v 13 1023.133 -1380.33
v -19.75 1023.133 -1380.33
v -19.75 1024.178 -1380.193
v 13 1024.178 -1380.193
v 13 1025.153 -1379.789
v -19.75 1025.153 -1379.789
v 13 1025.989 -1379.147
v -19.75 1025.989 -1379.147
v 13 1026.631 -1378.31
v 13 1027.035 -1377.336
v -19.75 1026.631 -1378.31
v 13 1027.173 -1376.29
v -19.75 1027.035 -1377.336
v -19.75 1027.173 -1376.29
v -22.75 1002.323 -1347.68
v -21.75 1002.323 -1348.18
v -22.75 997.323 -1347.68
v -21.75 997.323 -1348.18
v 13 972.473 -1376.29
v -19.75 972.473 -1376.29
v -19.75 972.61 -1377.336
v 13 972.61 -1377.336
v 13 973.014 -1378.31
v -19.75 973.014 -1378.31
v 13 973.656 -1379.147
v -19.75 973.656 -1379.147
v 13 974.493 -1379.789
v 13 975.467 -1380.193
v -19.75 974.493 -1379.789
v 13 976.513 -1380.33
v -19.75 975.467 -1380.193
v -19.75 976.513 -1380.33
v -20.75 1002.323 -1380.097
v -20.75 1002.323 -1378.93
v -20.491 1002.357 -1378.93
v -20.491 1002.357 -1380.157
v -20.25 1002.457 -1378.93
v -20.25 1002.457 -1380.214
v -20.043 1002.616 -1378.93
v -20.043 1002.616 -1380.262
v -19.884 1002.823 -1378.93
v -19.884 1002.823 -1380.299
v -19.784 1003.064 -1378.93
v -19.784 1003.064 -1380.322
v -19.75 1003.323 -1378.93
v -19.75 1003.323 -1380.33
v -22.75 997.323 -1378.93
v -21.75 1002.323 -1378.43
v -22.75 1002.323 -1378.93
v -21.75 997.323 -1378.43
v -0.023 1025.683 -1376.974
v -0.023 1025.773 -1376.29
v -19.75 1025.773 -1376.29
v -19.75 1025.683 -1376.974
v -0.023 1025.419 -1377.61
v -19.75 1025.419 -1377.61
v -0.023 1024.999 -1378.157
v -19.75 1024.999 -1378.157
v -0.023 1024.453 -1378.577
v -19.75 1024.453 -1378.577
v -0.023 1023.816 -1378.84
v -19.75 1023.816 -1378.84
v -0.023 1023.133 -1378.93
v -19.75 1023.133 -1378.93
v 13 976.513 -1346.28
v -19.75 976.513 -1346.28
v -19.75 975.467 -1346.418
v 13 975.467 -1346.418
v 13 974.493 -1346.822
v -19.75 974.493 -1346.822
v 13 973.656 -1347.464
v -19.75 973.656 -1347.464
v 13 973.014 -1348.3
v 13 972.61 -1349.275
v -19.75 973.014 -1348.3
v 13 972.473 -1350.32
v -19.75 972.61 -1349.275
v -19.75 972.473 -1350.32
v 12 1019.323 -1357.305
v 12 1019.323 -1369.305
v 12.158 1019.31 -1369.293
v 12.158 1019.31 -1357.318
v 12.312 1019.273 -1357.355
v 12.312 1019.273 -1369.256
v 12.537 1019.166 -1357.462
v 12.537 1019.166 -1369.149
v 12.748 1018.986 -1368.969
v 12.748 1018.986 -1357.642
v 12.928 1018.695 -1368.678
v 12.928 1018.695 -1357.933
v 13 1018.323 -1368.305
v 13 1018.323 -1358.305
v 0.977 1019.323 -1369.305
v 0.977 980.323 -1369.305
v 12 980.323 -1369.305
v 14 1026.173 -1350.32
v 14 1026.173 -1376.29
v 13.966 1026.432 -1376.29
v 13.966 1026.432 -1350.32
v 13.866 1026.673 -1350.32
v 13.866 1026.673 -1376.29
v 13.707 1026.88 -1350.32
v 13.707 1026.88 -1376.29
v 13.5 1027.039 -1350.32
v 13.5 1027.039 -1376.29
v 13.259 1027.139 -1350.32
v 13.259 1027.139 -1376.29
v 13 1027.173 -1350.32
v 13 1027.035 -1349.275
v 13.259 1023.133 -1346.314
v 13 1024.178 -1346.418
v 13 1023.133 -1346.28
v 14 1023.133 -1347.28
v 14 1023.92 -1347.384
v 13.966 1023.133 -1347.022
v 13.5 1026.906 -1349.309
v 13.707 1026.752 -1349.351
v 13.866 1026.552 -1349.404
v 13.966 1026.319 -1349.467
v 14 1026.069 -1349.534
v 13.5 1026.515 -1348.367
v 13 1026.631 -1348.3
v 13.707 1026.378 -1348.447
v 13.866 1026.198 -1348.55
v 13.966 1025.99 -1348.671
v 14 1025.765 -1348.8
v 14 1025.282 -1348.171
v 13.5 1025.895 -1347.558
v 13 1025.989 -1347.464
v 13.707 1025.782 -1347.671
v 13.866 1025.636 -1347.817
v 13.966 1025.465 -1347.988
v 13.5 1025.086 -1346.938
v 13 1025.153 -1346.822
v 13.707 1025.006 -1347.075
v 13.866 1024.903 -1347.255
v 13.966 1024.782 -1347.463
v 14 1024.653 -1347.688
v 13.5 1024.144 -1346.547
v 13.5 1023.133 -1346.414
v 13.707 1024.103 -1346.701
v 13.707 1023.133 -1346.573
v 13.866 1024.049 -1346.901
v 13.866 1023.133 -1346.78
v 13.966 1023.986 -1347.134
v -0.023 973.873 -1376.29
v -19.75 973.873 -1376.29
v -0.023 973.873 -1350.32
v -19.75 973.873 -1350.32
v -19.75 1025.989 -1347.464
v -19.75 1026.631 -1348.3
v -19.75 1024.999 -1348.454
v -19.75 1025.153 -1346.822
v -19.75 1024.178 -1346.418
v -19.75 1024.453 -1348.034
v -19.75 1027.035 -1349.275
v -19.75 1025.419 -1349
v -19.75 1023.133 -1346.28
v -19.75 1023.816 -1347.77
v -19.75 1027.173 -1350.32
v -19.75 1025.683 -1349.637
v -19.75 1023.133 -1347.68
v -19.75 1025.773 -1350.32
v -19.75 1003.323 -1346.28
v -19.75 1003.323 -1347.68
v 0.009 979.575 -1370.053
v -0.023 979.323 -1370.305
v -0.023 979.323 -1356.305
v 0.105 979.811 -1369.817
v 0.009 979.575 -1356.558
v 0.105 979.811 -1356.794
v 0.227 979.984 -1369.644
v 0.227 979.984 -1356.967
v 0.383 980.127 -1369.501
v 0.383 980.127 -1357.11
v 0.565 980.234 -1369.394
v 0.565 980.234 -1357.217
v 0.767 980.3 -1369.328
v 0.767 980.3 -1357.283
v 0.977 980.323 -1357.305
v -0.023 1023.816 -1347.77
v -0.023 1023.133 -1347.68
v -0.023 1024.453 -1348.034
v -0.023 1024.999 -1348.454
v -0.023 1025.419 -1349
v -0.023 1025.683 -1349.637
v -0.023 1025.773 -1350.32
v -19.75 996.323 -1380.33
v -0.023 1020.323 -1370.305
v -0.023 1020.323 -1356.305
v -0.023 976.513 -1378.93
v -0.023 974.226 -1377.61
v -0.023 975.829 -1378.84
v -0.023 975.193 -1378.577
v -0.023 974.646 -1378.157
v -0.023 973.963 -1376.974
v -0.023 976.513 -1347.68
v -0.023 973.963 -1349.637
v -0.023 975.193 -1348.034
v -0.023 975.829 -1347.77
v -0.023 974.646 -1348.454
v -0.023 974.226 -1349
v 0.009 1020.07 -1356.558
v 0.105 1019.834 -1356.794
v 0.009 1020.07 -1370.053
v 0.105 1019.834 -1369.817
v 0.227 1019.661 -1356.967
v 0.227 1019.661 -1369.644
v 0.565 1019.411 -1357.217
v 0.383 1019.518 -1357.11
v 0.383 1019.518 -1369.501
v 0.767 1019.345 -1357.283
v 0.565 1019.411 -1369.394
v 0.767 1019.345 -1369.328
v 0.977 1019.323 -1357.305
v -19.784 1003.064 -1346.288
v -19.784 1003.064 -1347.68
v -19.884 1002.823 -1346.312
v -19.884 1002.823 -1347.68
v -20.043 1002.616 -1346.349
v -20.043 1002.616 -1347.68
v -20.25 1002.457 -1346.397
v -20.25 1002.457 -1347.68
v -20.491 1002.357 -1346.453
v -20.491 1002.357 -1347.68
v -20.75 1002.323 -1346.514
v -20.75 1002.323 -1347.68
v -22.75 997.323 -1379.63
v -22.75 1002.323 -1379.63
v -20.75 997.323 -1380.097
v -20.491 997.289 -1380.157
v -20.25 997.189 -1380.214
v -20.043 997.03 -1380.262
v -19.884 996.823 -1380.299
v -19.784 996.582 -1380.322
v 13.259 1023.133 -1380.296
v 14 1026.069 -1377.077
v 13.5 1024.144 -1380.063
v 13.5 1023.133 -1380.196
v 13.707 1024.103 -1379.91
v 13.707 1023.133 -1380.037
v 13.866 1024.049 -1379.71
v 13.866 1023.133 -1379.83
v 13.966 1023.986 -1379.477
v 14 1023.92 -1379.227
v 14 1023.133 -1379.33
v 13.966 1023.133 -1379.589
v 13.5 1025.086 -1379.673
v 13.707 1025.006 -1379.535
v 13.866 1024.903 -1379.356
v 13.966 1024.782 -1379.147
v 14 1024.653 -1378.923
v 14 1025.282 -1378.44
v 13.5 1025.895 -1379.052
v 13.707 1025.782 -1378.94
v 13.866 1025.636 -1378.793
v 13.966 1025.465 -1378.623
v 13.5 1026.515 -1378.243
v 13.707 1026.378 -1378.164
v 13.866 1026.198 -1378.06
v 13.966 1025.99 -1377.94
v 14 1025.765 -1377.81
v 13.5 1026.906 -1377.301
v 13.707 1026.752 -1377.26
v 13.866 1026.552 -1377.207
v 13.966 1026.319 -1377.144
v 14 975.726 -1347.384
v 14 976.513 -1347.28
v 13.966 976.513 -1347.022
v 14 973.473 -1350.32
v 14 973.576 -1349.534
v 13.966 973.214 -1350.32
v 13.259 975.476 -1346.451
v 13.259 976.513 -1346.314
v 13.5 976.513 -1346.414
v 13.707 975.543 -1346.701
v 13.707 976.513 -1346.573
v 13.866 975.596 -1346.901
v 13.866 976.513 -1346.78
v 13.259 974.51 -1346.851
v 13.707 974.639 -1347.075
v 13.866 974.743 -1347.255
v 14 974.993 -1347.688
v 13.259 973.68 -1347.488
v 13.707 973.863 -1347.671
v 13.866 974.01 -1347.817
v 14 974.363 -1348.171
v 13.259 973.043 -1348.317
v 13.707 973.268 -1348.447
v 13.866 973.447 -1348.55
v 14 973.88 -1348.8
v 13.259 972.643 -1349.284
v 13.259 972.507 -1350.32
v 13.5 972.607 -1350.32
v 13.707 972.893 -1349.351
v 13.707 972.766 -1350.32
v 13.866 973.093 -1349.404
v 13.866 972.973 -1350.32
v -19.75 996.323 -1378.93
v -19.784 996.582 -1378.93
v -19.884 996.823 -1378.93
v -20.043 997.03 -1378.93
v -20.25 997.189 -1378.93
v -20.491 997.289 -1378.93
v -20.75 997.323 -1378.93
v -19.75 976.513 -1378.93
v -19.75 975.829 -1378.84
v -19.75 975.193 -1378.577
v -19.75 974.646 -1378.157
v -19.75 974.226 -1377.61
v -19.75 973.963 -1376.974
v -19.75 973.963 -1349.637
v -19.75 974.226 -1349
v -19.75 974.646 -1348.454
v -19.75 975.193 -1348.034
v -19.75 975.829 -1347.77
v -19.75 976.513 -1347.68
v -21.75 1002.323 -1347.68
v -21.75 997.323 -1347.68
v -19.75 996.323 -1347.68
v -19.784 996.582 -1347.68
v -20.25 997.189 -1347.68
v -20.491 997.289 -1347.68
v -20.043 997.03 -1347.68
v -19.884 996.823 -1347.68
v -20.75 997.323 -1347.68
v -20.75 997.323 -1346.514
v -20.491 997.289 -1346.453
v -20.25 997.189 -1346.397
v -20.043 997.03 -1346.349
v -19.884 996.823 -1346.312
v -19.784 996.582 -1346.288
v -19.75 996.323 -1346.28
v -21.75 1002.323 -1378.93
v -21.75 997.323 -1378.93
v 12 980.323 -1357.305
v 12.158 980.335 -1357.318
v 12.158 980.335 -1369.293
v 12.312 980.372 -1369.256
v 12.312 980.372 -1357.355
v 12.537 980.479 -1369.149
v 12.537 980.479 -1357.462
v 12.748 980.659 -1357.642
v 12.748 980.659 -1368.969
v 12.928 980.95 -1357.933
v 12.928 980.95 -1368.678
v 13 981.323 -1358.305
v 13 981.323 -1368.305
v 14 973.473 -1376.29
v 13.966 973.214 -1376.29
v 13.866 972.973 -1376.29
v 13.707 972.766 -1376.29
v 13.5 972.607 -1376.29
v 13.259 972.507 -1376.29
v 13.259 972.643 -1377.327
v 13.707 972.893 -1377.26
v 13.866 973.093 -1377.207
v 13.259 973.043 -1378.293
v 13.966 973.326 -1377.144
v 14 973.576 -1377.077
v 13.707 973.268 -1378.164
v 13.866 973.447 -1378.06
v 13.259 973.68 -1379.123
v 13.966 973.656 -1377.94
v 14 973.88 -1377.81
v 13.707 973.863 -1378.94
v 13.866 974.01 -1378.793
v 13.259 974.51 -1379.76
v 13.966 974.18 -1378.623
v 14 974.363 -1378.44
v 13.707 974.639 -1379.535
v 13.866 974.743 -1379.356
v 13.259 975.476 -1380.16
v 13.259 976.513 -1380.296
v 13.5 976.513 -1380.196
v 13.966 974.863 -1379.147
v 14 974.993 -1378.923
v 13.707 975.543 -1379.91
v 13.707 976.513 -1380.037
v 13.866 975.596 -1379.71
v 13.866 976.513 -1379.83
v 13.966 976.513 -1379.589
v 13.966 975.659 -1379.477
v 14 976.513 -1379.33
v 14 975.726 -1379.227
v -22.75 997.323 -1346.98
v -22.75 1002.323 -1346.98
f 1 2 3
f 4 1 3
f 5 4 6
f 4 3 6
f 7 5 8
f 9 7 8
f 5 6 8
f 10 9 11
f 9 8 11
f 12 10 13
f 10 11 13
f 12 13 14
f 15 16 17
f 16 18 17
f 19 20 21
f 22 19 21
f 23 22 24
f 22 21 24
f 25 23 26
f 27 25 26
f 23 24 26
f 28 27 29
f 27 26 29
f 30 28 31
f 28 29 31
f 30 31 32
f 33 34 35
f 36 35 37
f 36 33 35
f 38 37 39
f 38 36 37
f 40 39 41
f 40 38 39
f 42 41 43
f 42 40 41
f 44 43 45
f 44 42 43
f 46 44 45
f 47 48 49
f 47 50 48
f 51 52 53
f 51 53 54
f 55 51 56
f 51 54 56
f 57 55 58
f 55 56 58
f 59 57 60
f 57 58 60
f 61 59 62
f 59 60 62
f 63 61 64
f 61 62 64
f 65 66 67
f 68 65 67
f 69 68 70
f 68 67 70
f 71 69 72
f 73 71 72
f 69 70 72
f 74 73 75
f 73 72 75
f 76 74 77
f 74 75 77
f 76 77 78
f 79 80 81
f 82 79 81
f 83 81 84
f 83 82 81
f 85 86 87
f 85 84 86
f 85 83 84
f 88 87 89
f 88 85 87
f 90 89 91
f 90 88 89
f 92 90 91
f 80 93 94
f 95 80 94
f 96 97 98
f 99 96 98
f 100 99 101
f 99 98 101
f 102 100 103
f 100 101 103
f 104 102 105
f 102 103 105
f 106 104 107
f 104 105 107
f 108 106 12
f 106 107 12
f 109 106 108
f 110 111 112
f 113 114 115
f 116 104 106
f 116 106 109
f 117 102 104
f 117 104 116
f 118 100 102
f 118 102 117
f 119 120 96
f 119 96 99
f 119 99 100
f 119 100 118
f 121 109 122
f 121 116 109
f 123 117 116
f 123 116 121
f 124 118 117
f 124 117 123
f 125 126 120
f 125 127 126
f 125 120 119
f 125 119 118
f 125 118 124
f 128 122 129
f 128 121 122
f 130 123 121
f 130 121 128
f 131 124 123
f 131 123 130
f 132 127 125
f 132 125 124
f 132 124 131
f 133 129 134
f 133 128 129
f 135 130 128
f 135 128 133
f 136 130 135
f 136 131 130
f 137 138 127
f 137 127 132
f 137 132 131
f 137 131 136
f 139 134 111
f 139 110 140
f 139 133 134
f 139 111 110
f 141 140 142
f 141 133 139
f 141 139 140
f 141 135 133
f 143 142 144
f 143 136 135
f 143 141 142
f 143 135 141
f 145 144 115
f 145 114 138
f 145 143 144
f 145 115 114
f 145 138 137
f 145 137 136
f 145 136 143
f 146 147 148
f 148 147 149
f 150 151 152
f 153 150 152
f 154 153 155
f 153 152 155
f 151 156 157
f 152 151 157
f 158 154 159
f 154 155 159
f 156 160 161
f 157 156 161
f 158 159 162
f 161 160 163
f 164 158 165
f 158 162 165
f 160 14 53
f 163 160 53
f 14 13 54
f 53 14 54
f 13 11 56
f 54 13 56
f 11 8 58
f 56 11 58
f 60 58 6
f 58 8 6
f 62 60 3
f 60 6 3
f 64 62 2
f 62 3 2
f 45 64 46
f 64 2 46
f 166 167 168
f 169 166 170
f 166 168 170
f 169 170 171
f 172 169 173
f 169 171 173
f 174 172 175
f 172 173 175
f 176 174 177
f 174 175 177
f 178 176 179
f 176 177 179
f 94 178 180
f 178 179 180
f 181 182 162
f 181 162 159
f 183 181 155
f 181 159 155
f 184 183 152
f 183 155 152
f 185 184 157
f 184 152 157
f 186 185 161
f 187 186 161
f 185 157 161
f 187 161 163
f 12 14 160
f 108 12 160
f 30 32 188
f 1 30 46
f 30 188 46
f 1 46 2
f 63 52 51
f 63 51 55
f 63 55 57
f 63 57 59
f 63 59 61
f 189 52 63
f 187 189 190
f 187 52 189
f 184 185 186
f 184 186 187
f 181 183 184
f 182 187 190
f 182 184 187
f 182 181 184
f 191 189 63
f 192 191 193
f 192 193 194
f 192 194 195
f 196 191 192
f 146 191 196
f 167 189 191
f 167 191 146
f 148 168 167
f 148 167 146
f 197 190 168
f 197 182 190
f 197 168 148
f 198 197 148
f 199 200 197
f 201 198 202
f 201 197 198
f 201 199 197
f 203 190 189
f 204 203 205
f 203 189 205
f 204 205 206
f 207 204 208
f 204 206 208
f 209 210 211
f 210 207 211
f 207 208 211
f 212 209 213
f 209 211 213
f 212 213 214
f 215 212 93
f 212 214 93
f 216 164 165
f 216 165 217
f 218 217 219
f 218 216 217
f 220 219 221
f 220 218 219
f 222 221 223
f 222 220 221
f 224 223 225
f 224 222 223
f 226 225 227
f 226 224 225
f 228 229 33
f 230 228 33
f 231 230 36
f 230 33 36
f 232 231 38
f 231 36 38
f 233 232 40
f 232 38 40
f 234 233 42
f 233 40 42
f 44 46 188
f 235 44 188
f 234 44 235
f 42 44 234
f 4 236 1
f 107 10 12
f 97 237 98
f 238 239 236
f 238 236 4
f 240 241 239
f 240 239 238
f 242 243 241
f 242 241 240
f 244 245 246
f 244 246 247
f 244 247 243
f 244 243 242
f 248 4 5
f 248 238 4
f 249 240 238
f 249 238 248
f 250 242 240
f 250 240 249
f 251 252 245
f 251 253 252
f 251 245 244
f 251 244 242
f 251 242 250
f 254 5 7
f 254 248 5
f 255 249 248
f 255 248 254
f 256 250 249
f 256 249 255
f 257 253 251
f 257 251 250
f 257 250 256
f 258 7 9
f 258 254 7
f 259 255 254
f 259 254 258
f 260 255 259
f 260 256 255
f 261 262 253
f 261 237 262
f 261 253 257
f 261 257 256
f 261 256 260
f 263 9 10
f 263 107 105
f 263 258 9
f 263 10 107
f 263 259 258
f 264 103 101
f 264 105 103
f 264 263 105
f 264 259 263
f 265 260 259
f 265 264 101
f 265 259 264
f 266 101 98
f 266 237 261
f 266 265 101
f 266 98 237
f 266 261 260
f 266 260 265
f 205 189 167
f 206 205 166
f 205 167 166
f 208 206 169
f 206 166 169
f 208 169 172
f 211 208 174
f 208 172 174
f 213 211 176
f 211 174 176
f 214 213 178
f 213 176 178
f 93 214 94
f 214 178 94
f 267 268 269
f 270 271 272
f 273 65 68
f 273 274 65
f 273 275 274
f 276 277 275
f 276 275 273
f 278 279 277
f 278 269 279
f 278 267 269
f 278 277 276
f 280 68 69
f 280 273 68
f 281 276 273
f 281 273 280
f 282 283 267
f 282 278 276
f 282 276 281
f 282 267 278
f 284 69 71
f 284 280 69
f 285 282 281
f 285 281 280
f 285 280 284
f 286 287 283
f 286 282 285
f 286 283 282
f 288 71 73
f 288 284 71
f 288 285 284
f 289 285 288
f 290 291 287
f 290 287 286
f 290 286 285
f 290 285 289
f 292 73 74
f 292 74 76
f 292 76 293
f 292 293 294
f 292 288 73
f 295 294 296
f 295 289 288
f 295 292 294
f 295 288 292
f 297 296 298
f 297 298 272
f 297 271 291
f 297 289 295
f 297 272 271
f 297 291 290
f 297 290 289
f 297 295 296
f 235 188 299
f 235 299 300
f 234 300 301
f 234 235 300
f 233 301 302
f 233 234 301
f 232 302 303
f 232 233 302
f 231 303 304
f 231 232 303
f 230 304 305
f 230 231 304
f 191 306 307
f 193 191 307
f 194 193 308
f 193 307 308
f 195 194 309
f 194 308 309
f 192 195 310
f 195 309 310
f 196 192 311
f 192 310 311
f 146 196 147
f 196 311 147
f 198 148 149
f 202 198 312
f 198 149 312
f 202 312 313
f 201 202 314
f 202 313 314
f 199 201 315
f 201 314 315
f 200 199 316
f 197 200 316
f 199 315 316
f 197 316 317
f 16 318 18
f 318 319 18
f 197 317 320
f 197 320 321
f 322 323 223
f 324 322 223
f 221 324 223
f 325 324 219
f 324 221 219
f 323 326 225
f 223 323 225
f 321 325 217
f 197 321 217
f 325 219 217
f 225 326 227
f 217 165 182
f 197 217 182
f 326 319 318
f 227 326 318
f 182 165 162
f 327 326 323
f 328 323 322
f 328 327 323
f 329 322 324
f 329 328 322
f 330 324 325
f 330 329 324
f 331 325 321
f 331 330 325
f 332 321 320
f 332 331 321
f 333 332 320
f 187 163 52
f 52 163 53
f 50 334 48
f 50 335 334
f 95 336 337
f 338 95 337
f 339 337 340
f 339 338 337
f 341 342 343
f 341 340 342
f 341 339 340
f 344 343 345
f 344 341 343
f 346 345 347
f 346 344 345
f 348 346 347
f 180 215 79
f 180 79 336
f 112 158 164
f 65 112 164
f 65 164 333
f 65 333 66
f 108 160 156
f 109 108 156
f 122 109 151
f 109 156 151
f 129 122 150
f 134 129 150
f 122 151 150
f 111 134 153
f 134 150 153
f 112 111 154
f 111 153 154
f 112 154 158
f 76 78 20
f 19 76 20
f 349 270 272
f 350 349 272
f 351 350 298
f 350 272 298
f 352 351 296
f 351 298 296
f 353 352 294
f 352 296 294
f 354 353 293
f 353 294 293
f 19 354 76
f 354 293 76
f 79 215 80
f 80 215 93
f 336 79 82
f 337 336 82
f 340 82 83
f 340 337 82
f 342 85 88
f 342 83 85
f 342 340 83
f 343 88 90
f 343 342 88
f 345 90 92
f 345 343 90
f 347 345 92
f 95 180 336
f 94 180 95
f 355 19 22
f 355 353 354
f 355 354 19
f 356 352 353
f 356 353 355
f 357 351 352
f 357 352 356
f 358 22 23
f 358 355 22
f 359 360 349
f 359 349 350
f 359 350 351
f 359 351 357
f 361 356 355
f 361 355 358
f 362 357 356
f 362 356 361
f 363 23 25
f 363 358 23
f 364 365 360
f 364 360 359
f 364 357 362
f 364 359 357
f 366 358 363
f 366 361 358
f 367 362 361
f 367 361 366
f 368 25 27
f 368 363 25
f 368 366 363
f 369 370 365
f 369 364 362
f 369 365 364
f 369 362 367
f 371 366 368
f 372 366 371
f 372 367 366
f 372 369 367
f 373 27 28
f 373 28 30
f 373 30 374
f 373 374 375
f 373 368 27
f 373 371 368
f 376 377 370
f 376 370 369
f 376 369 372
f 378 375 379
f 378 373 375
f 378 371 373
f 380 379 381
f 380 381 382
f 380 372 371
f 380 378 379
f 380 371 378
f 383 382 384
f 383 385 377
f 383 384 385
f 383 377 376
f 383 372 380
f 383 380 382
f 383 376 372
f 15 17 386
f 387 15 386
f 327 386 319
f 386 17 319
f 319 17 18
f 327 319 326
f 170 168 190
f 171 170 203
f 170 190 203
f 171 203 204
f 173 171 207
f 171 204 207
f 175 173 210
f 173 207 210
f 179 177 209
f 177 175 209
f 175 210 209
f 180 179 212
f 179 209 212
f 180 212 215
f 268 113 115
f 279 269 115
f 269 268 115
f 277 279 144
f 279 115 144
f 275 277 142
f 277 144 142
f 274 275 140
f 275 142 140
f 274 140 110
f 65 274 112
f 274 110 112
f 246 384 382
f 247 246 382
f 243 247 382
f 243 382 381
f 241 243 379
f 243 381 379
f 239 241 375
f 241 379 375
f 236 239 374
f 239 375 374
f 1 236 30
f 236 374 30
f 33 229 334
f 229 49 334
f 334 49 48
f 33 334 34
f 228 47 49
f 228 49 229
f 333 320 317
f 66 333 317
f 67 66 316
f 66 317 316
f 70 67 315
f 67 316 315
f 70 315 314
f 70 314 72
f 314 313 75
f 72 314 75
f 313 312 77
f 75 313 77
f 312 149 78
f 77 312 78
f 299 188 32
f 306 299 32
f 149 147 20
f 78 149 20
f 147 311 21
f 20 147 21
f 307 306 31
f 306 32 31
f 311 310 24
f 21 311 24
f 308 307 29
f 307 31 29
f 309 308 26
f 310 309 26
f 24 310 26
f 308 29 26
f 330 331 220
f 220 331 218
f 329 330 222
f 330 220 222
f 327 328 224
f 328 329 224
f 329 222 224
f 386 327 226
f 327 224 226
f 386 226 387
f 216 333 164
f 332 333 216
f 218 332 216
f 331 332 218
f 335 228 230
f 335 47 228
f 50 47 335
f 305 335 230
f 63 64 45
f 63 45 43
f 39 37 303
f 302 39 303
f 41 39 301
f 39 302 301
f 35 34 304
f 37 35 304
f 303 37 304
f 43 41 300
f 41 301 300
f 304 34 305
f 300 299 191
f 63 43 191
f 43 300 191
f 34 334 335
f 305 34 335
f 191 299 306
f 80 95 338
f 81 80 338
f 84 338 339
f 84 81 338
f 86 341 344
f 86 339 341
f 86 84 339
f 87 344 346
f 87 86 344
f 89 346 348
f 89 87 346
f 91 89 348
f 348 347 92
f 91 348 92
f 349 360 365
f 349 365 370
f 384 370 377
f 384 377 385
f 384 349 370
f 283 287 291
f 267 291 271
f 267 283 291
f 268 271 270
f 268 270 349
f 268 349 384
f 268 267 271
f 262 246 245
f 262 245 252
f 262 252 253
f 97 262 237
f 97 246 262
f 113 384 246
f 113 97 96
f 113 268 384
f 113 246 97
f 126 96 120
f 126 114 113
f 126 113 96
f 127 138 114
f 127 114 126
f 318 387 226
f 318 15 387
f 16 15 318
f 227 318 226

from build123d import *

# Parameters (mm, degrees)
BOSS_EXTRUDE2_DEPTH      = 13
BOSS_EXTRUDE2_DEPTH_BACK = 19.75
SKETCH2_W                = 39
SKETCH2_H                = 12
BOSS_EXTRUDE3_DEPTH      = 1
CUT_EXTRUDE1_DEPTH       = 19.727
CLIP_EDGE_DEPTH          = 2.5
FILLET1_R                = 1


with BuildPart() as part:
    # Sketch2 → Boss-Extrude2 (new, two sides: drawn at the far end of the back side and taken through both)
    with BuildSketch(Plane(origin=(0, 0, 0), x_dir=(0, -1, 0), z_dir=(1, 0, 0)).offset(-BOSS_EXTRUDE2_DEPTH_BACK)):
        with BuildLine():
            Line((-1027.172700071, 1376.290334899), (-1027.172700071, 1350.320334899))
            ThreePointArc((-1027.172700071, 1350.320334899), (-1025.989411467, 1347.463623503), (-1023.132700071, 1346.280334899))
            Line((-1023.132700071, 1346.280334899), (-976.512700071, 1346.280334899))
            ThreePointArc((-976.512700071, 1346.280334899), (-973.655988675, 1347.463623503), (-972.472700071, 1350.320334899))
            Line((-972.472700071, 1350.320334899), (-972.472700071, 1376.290334899))
            ThreePointArc((-972.472700071, 1376.290334899), (-973.655988675, 1379.147046295), (-976.512700071, 1380.330334899))
            Line((-976.512700071, 1380.330334899), (-1023.132700071, 1380.330334899))
            ThreePointArc((-1023.132700071, 1380.330334899), (-1025.989411467, 1379.147046295), (-1027.172700071, 1376.290334899))
        make_face()
        with Locations((-999.822700071, 1363.305334899)):
            Rectangle(SKETCH2_W, SKETCH2_H, mode=Mode.SUBTRACT)
    extrude(amount=BOSS_EXTRUDE2_DEPTH + BOSS_EXTRUDE2_DEPTH_BACK)

    # Sketch3 → Boss-Extrude3 (add)
    with BuildSketch(Plane.YZ.offset(13)):
        with BuildLine():
            Line((972.472700071, -1350.320334899), (972.472700071, -1376.290334899))
            ThreePointArc((972.472700071, -1376.290334899), (973.655988675, -1379.147046295), (976.512700071, -1380.330334899))
            Line((976.512700071, -1380.330334899), (1023.132700071, -1380.330334899))
            ThreePointArc((1023.132700071, -1380.330334899), (1025.989411467, -1379.147046295), (1027.172700071, -1376.290334899))
            Line((1027.172700071, -1376.290334899), (1027.172700071, -1350.320334899))
            ThreePointArc((1027.172700071, -1350.320334899), (1025.989411467, -1347.463623503), (1023.132700071, -1346.280334899))
            Line((1023.132700071, -1346.280334899), (976.512700071, -1346.280334899))
            ThreePointArc((976.512700071, -1346.280334899), (973.655988675, -1347.463623503), (972.472700071, -1350.320334899))
        make_face()
    extrude(amount=BOSS_EXTRUDE3_DEPTH)

    # Sketch6 → Cut-Extrude1 (cut)
    with BuildSketch(Plane(origin=(-19.75, 0, 0), x_dir=(0, -1, 0), z_dir=(-1, 0, 0))):
        with BuildLine():
            Line((-1025.772700071, -1350.320334899), (-1025.772700071, -1376.290334899))
            ThreePointArc((-1025.772700071, -1376.290334899), (-1024.999461974, -1378.157096801), (-1023.132700071, -1378.930334899))
            Line((-1023.132700071, -1378.930334899), (-976.512700071, -1378.930334899))
            ThreePointArc((-976.512700071, -1378.930334899), (-974.645938169, -1378.157096801), (-973.872700071, -1376.290334899))
            Line((-973.872700071, -1376.290334899), (-973.872700071, -1350.320334899))
            ThreePointArc((-973.872700071, -1350.320334899), (-974.645938169, -1348.453572996), (-976.512700071, -1347.680334899))
            Line((-976.512700071, -1347.680334899), (-1023.132700071, -1347.680334899))
            ThreePointArc((-1023.132700071, -1347.680334899), (-1024.999461974, -1348.453572996), (-1025.772700071, -1350.320334899))
        make_face()
    extrude(amount=-CUT_EXTRUDE1_DEPTH, mode=Mode.SUBTRACT)

    # Sketch10 → Clip Edge (add, symmetric)
    with BuildSketch(Plane(origin=(0, 999.822700071, 0), x_dir=(-1, 0, 0), z_dir=(0, -1, 0))):
        Polygon((19.75, 1346.280334899), (19.75, 1347.680334899), (21.75, 1347.680334899), (21.75, 1348.180334899), (22.75, 1347.680334899), (22.75, 1346.980334899), align=None)
    clip_edge = extrude(amount=CLIP_EDGE_DEPTH, both=True)

    # Mirror1: Clip Edge across plane
    add(clip_edge.mirror(Plane(origin=(0, 0, -1363.305334899), x_dir=(1, 0, 0), z_dir=(0, 0, -1))))

    # Fillet1
    # the kernel refuses this fillet: 1 mm, written as the material it adds along each edge
    with BuildSketch(Plane(origin=(-19.75, 1002.322700071, -1346.280334899), x_dir=(0, 1, 0), z_dir=(0, 0, -1))) as fillet1_piece_1_section:
        with BuildLine():
            CenterArc((FILLET1_R, -FILLET1_R), FILLET1_R, 90, 90)
            Line((0, -FILLET1_R), (0, 0))
            Line((0, 0), (FILLET1_R, 0))
        make_face()
    fillet1_piece_1 = extrude(amount=1.4, mode=Mode.PRIVATE)
    fillet1_piece_1 = split(fillet1_piece_1, bisect_by=Plane(origin=(-20.117660962, 1002.553814872, -1346.366122456), z_dir=(0.22722961560622243, 0, -0.973841209741839)), keep=Keep.TOP, mode=Mode.PRIVATE)
    add(fillet1_piece_1)
    with BuildSketch(Plane(origin=(-19.75, 997.322700071, -1346.280334899), x_dir=(0, -1, 0), z_dir=(0, 0, -1))) as fillet1_piece_2_section:
        with BuildLine():
            CenterArc((FILLET1_R, FILLET1_R), FILLET1_R, 180, 90)
            Line((0, FILLET1_R), (0, 0))
            Line((0, 0), (FILLET1_R, 0))
        make_face()
    fillet1_piece_2 = extrude(amount=1.4, mode=Mode.PRIVATE)
    fillet1_piece_2 = split(fillet1_piece_2, bisect_by=Plane(origin=(-20.117660962, 997.091585271, -1346.366122456), z_dir=(0.22722961560622243, 0, -0.973841209741839)), keep=Keep.TOP, mode=Mode.PRIVATE)
    add(fillet1_piece_2)
    with BuildSketch(Plane(origin=(-19.75, 997.322700071, -1380.330334899), x_dir=(0, -1, 0), z_dir=(0, 0, 1))) as fillet1_piece_3_section:
        with BuildLine():
            CenterArc((FILLET1_R, -FILLET1_R), FILLET1_R, 90, 90)
            Line((0, -FILLET1_R), (0, 0))
            Line((0, 0), (FILLET1_R, 0))
        make_face()
    fillet1_piece_3 = extrude(amount=1.4, mode=Mode.PRIVATE)
    fillet1_piece_3 = split(fillet1_piece_3, bisect_by=Plane(origin=(-20.117660962, 997.091585271, -1380.244547341), z_dir=(0.22722961560622243, 0, 0.973841209741839)), keep=Keep.TOP, mode=Mode.PRIVATE)
    add(fillet1_piece_3)
    with BuildSketch(Plane(origin=(-19.75, 1002.322700071, -1380.330334899), x_dir=(0, 1, 0), z_dir=(0, 0, 1))) as fillet1_piece_4_section:
        with BuildLine():
            CenterArc((FILLET1_R, FILLET1_R), FILLET1_R, 180, 90)
            Line((0, FILLET1_R), (0, 0))
            Line((0, 0), (FILLET1_R, 0))
        make_face()
    fillet1_piece_4 = extrude(amount=1.4, mode=Mode.PRIVATE)
    fillet1_piece_4 = split(fillet1_piece_4, bisect_by=Plane(origin=(-20.117660962, 1002.553814872, -1380.244547341), z_dir=(0.22722961560622243, 0, 0.973841209741839)), keep=Keep.TOP, mode=Mode.PRIVATE)
    add(fillet1_piece_4)
    with BuildSketch(Plane(origin=(13, 1021.822700071, -1369.305334899), x_dir=(-1, 0, 0), z_dir=(0, -1, 0)), Plane(origin=(13, 977.822700071, -1357.305334899), x_dir=(-1, 0, 0), z_dir=(0, 1, 0))) as fillet1_piece_5:
        with BuildLine():
            CenterArc((FILLET1_R, -FILLET1_R), FILLET1_R, 90, 90)
            Line((0, -FILLET1_R), (0, 0))
            Line((0, 0), (FILLET1_R, 0))
        make_face()
    extrude(amount=44)
    with BuildSketch(Plane(origin=(13, 1019.322700071, -1354.805334899), x_dir=(-1, 0, 0), z_dir=(0, 0, -1)), Plane(origin=(13, 980.322700071, -1371.805334899), x_dir=(-1, 0, 0), z_dir=(0, 0, 1))) as fillet1_piece_6:
        with BuildLine():
            CenterArc((FILLET1_R, -FILLET1_R), FILLET1_R, 90, 90)
            Line((0, -FILLET1_R), (0, 0))
            Line((0, 0), (FILLET1_R, 0))
        make_face()
    extrude(amount=17)
    # the kernel refuses this fillet: 1 mm, written as the material it takes off along each edge
    with BuildSketch(Plane(origin=(14, 976.512700071, -1350.320334899), x_dir=(0, 0, 1), z_dir=(0, 1, 0))) as fillet1_2_piece_1:
        with BuildLine():
            CenterArc((4.04 - FILLET1_R, -FILLET1_R), FILLET1_R, 0, 90)
            Line((4.04 - FILLET1_R, 0), (4.04, 0))
            Line((4.04, 0), (4.04, -FILLET1_R))
        make_face()
    revolve(axis=Axis((14, 976.512700071, -1350.320334899), (1, 0, 0)), revolution_arc=90, mode=Mode.SUBTRACT)
    with BuildSketch(Plane(origin=(14, 972.472700071, -1350.320334899), x_dir=(-1, 0, 0), z_dir=(0, 0, -1)), Plane(origin=(14, 1027.172700071, -1376.290334899), x_dir=(-1, 0, 0), z_dir=(0, 0, 1))) as fillet1_2_piece_2:
        with BuildLine():
            CenterArc((FILLET1_R, FILLET1_R), FILLET1_R, 180, 90)
            Line((0, FILLET1_R), (0, 0))
            Line((0, 0), (FILLET1_R, 0))
        make_face()
    extrude(amount=25.97, mode=Mode.SUBTRACT)
    with BuildSketch(Plane(origin=(14, 976.512700071, -1376.290334899), x_dir=(0, -1, 0), z_dir=(0, 0, 1))) as fillet1_2_piece_3:
        with BuildLine():
            CenterArc((4.04 - FILLET1_R, -FILLET1_R), FILLET1_R, 0, 90)
            Line((4.04 - FILLET1_R, 0), (4.04, 0))
            Line((4.04, 0), (4.04, -FILLET1_R))
        make_face()
    revolve(axis=Axis((14, 976.512700071, -1376.290334899), (1, 0, 0)), revolution_arc=90, mode=Mode.SUBTRACT)
    with BuildSketch(Plane(origin=(14, 976.512700071, -1380.330334899), x_dir=(-1, 0, 0), z_dir=(0, 1, 0)), Plane(origin=(14, 1023.132700071, -1346.280334899), x_dir=(-1, 0, 0), z_dir=(0, -1, 0))) as fillet1_2_piece_4:
        with BuildLine():
            CenterArc((FILLET1_R, FILLET1_R), FILLET1_R, 180, 90)
            Line((0, FILLET1_R), (0, 0))
            Line((0, 0), (FILLET1_R, 0))
        make_face()
    extrude(amount=46.62, mode=Mode.SUBTRACT)
    with BuildSketch(Plane(origin=(14, 1023.132700071, -1376.290334899), x_dir=(0, 0, -1), z_dir=(0, -1, 0))) as fillet1_2_piece_5:
        with BuildLine():
            CenterArc((4.04 - FILLET1_R, -FILLET1_R), FILLET1_R, 0, 90)
            Line((4.04, -FILLET1_R), (4.04, 0))
            Line((4.04, 0), (4.04 - FILLET1_R, 0))
        make_face()
    revolve(axis=Axis((14, 1023.132700071, -1376.290334899), (1, 0, 0)), revolution_arc=90, mode=Mode.SUBTRACT)
    with BuildSketch(Plane(origin=(14, 1023.132700071, -1350.320334899), x_dir=(0, 1, 0), z_dir=(0, 0, -1))) as fillet1_2_piece_6:
        with BuildLine():
            CenterArc((4.04 - FILLET1_R, -FILLET1_R), FILLET1_R, 0, 90)
            Line((4.04 - FILLET1_R, 0), (4.04, 0))
            Line((4.04, 0), (4.04, -FILLET1_R))
        make_face()
    revolve(axis=Axis((14, 1023.132700071, -1350.320334899), (1, 0, 0)), revolution_arc=90, mode=Mode.SUBTRACT)
    with BuildSketch(Plane(origin=(-0.023, 1019.322700071, -1369.305334899), x_dir=(0, 1, 0), z_dir=(0, 0, 1)), Plane(origin=(-0.023, 980.322700071, -1357.305334899), x_dir=(0, -1, 0), z_dir=(0, 0, -1))) as fillet1_2_piece_7:
        with BuildLine():
            CenterArc((FILLET1_R, -FILLET1_R), FILLET1_R, 90, 90)
            Line((0, -FILLET1_R), (0, 0))
            Line((0, 0), (FILLET1_R, 0))
        make_face()
    extrude(amount=12, mode=Mode.SUBTRACT)
    with BuildSketch(Plane(origin=(-0.023, 980.322700071, -1369.305334899), x_dir=(0, 0, -1), z_dir=(0, 1, 0)), Plane(origin=(-0.023, 1019.322700071, -1357.305334899), x_dir=(0, 0, 1), z_dir=(0, -1, 0))) as fillet1_2_piece_8:
        with BuildLine():
            CenterArc((FILLET1_R, -FILLET1_R), FILLET1_R, 90, 90)
            Line((0, -FILLET1_R), (0, 0))
            Line((0, 0), (FILLET1_R, 0))
        make_face()
    extrude(amount=39, mode=Mode.SUBTRACT)
    with BuildSketch(Plane(origin=(-0.023, 1019.322700071, -1371.805334899), x_dir=(0, 1, 0), z_dir=(0, 0, 1))) as fillet1_2_piece_9a_section:
        with BuildLine():
            CenterArc((FILLET1_R, -FILLET1_R), FILLET1_R, 90, 90)
            Line((0, -FILLET1_R), (0, 0))
            Line((0, 0), (FILLET1_R, 0))
        make_face()
    fillet1_2_piece_9a = extrude(amount=14.5, mode=Mode.PRIVATE)
    fillet1_2_piece_9a = split(fillet1_2_piece_9a, bisect_by=Plane(origin=(0.203395114, 1019.549095185, -1369.305334899), z_dir=(0, 0, -1)), keep=Keep.TOP, mode=Mode.PRIVATE)
    with BuildSketch(Plane(origin=(-0.023, 980.322700071, -1369.305334899), x_dir=(0, 0, -1), z_dir=(0, 1, 0))) as fillet1_2_piece_9b_section:
        with BuildLine():
            CenterArc((FILLET1_R, -FILLET1_R), FILLET1_R, 90, 90)
            Line((0, -FILLET1_R), (0, 0))
            Line((0, 0), (FILLET1_R, 0))
        make_face()
    fillet1_2_piece_9b = extrude(amount=41.5, mode=Mode.PRIVATE)
    fillet1_2_piece_9b = split(fillet1_2_piece_9b, bisect_by=Plane(origin=(0.203395114, 1019.322700071, -1369.531730013), z_dir=(0, 1, 0)), keep=Keep.TOP, mode=Mode.PRIVATE)
    fillet1_2_piece_9 = fillet1_2_piece_9a & fillet1_2_piece_9b
    add(fillet1_2_piece_9, mode=Mode.SUBTRACT)
    with BuildSketch(Plane(origin=(-0.023, 1021.822700071, -1357.305334899), x_dir=(0, 0, 1), z_dir=(0, -1, 0))) as fillet1_2_piece_10a_section:
        with BuildLine():
            CenterArc((FILLET1_R, -FILLET1_R), FILLET1_R, 90, 90)
            Line((0, -FILLET1_R), (0, 0))
            Line((0, 0), (FILLET1_R, 0))
        make_face()
    fillet1_2_piece_10a = extrude(amount=41.5, mode=Mode.PRIVATE)
    fillet1_2_piece_10a = split(fillet1_2_piece_10a, bisect_by=Plane(origin=(0.203395114, 1019.322700071, -1357.078939784), z_dir=(0, 1, 0)), keep=Keep.TOP, mode=Mode.PRIVATE)
    with BuildSketch(Plane(origin=(-0.023, 1019.322700071, -1369.305334899), x_dir=(0, 1, 0), z_dir=(0, 0, 1))) as fillet1_2_piece_10b_section:
        with BuildLine():
            CenterArc((FILLET1_R, -FILLET1_R), FILLET1_R, 90, 90)
            Line((0, -FILLET1_R), (0, 0))
            Line((0, 0), (FILLET1_R, 0))
        make_face()
    fillet1_2_piece_10b = extrude(amount=14.5, mode=Mode.PRIVATE)
    fillet1_2_piece_10b = split(fillet1_2_piece_10b, bisect_by=Plane(origin=(0.203395114, 1019.549095185, -1357.305334899), z_dir=(0, 0, 1)), keep=Keep.TOP, mode=Mode.PRIVATE)
    fillet1_2_piece_10 = fillet1_2_piece_10a & fillet1_2_piece_10b
    add(fillet1_2_piece_10, mode=Mode.SUBTRACT)
    with BuildSketch(Plane(origin=(-0.023, 980.322700071, -1357.305334899), x_dir=(0, -1, 0), z_dir=(0, 0, -1))) as fillet1_2_piece_11a_section:
        with BuildLine():
            CenterArc((FILLET1_R, -FILLET1_R), FILLET1_R, 90, 90)
            Line((0, -FILLET1_R), (0, 0))
            Line((0, 0), (FILLET1_R, 0))
        make_face()
    fillet1_2_piece_11a = extrude(amount=14.5, mode=Mode.PRIVATE)
    fillet1_2_piece_11a = split(fillet1_2_piece_11a, bisect_by=Plane(origin=(0.203395114, 980.096304957, -1369.305334899), z_dir=(0, 0, -1)), keep=Keep.TOP, mode=Mode.PRIVATE)
    with BuildSketch(Plane(origin=(-0.023, 977.822700071, -1369.305334899), x_dir=(0, 0, -1), z_dir=(0, 1, 0))) as fillet1_2_piece_11b_section:
        with BuildLine():
            CenterArc((FILLET1_R, -FILLET1_R), FILLET1_R, 90, 90)
            Line((0, -FILLET1_R), (0, 0))
            Line((0, 0), (FILLET1_R, 0))
        make_face()
    fillet1_2_piece_11b = extrude(amount=41.5, mode=Mode.PRIVATE)
    fillet1_2_piece_11b = split(fillet1_2_piece_11b, bisect_by=Plane(origin=(0.203395114, 980.322700071, -1369.531730013), z_dir=(0, -1, 0)), keep=Keep.TOP, mode=Mode.PRIVATE)
    fillet1_2_piece_11 = fillet1_2_piece_11a & fillet1_2_piece_11b
    add(fillet1_2_piece_11, mode=Mode.SUBTRACT)
    with BuildSketch(Plane(origin=(-0.023, 980.322700071, -1354.805334899), x_dir=(0, -1, 0), z_dir=(0, 0, -1))) as fillet1_2_piece_12a_section:
        with BuildLine():
            CenterArc((FILLET1_R, -FILLET1_R), FILLET1_R, 90, 90)
            Line((0, -FILLET1_R), (0, 0))
            Line((0, 0), (FILLET1_R, 0))
        make_face()
    fillet1_2_piece_12a = extrude(amount=14.5, mode=Mode.PRIVATE)
    fillet1_2_piece_12a = split(fillet1_2_piece_12a, bisect_by=Plane(origin=(0.203395114, 980.096304957, -1357.305334899), z_dir=(0, 0, 1)), keep=Keep.TOP, mode=Mode.PRIVATE)
    with BuildSketch(Plane(origin=(-0.023, 1019.322700071, -1357.305334899), x_dir=(0, 0, 1), z_dir=(0, -1, 0))) as fillet1_2_piece_12b_section:
        with BuildLine():
            CenterArc((FILLET1_R, -FILLET1_R), FILLET1_R, 90, 90)
            Line((0, -FILLET1_R), (0, 0))
            Line((0, 0), (FILLET1_R, 0))
        make_face()
    fillet1_2_piece_12b = extrude(amount=41.5, mode=Mode.PRIVATE)
    fillet1_2_piece_12b = split(fillet1_2_piece_12b, bisect_by=Plane(origin=(0.203395114, 980.322700071, -1357.078939784), z_dir=(0, -1, 0)), keep=Keep.TOP, mode=Mode.PRIVATE)
    fillet1_2_piece_12 = fillet1_2_piece_12a & fillet1_2_piece_12b
    add(fillet1_2_piece_12, mode=Mode.SUBTRACT)


solid = part.part
